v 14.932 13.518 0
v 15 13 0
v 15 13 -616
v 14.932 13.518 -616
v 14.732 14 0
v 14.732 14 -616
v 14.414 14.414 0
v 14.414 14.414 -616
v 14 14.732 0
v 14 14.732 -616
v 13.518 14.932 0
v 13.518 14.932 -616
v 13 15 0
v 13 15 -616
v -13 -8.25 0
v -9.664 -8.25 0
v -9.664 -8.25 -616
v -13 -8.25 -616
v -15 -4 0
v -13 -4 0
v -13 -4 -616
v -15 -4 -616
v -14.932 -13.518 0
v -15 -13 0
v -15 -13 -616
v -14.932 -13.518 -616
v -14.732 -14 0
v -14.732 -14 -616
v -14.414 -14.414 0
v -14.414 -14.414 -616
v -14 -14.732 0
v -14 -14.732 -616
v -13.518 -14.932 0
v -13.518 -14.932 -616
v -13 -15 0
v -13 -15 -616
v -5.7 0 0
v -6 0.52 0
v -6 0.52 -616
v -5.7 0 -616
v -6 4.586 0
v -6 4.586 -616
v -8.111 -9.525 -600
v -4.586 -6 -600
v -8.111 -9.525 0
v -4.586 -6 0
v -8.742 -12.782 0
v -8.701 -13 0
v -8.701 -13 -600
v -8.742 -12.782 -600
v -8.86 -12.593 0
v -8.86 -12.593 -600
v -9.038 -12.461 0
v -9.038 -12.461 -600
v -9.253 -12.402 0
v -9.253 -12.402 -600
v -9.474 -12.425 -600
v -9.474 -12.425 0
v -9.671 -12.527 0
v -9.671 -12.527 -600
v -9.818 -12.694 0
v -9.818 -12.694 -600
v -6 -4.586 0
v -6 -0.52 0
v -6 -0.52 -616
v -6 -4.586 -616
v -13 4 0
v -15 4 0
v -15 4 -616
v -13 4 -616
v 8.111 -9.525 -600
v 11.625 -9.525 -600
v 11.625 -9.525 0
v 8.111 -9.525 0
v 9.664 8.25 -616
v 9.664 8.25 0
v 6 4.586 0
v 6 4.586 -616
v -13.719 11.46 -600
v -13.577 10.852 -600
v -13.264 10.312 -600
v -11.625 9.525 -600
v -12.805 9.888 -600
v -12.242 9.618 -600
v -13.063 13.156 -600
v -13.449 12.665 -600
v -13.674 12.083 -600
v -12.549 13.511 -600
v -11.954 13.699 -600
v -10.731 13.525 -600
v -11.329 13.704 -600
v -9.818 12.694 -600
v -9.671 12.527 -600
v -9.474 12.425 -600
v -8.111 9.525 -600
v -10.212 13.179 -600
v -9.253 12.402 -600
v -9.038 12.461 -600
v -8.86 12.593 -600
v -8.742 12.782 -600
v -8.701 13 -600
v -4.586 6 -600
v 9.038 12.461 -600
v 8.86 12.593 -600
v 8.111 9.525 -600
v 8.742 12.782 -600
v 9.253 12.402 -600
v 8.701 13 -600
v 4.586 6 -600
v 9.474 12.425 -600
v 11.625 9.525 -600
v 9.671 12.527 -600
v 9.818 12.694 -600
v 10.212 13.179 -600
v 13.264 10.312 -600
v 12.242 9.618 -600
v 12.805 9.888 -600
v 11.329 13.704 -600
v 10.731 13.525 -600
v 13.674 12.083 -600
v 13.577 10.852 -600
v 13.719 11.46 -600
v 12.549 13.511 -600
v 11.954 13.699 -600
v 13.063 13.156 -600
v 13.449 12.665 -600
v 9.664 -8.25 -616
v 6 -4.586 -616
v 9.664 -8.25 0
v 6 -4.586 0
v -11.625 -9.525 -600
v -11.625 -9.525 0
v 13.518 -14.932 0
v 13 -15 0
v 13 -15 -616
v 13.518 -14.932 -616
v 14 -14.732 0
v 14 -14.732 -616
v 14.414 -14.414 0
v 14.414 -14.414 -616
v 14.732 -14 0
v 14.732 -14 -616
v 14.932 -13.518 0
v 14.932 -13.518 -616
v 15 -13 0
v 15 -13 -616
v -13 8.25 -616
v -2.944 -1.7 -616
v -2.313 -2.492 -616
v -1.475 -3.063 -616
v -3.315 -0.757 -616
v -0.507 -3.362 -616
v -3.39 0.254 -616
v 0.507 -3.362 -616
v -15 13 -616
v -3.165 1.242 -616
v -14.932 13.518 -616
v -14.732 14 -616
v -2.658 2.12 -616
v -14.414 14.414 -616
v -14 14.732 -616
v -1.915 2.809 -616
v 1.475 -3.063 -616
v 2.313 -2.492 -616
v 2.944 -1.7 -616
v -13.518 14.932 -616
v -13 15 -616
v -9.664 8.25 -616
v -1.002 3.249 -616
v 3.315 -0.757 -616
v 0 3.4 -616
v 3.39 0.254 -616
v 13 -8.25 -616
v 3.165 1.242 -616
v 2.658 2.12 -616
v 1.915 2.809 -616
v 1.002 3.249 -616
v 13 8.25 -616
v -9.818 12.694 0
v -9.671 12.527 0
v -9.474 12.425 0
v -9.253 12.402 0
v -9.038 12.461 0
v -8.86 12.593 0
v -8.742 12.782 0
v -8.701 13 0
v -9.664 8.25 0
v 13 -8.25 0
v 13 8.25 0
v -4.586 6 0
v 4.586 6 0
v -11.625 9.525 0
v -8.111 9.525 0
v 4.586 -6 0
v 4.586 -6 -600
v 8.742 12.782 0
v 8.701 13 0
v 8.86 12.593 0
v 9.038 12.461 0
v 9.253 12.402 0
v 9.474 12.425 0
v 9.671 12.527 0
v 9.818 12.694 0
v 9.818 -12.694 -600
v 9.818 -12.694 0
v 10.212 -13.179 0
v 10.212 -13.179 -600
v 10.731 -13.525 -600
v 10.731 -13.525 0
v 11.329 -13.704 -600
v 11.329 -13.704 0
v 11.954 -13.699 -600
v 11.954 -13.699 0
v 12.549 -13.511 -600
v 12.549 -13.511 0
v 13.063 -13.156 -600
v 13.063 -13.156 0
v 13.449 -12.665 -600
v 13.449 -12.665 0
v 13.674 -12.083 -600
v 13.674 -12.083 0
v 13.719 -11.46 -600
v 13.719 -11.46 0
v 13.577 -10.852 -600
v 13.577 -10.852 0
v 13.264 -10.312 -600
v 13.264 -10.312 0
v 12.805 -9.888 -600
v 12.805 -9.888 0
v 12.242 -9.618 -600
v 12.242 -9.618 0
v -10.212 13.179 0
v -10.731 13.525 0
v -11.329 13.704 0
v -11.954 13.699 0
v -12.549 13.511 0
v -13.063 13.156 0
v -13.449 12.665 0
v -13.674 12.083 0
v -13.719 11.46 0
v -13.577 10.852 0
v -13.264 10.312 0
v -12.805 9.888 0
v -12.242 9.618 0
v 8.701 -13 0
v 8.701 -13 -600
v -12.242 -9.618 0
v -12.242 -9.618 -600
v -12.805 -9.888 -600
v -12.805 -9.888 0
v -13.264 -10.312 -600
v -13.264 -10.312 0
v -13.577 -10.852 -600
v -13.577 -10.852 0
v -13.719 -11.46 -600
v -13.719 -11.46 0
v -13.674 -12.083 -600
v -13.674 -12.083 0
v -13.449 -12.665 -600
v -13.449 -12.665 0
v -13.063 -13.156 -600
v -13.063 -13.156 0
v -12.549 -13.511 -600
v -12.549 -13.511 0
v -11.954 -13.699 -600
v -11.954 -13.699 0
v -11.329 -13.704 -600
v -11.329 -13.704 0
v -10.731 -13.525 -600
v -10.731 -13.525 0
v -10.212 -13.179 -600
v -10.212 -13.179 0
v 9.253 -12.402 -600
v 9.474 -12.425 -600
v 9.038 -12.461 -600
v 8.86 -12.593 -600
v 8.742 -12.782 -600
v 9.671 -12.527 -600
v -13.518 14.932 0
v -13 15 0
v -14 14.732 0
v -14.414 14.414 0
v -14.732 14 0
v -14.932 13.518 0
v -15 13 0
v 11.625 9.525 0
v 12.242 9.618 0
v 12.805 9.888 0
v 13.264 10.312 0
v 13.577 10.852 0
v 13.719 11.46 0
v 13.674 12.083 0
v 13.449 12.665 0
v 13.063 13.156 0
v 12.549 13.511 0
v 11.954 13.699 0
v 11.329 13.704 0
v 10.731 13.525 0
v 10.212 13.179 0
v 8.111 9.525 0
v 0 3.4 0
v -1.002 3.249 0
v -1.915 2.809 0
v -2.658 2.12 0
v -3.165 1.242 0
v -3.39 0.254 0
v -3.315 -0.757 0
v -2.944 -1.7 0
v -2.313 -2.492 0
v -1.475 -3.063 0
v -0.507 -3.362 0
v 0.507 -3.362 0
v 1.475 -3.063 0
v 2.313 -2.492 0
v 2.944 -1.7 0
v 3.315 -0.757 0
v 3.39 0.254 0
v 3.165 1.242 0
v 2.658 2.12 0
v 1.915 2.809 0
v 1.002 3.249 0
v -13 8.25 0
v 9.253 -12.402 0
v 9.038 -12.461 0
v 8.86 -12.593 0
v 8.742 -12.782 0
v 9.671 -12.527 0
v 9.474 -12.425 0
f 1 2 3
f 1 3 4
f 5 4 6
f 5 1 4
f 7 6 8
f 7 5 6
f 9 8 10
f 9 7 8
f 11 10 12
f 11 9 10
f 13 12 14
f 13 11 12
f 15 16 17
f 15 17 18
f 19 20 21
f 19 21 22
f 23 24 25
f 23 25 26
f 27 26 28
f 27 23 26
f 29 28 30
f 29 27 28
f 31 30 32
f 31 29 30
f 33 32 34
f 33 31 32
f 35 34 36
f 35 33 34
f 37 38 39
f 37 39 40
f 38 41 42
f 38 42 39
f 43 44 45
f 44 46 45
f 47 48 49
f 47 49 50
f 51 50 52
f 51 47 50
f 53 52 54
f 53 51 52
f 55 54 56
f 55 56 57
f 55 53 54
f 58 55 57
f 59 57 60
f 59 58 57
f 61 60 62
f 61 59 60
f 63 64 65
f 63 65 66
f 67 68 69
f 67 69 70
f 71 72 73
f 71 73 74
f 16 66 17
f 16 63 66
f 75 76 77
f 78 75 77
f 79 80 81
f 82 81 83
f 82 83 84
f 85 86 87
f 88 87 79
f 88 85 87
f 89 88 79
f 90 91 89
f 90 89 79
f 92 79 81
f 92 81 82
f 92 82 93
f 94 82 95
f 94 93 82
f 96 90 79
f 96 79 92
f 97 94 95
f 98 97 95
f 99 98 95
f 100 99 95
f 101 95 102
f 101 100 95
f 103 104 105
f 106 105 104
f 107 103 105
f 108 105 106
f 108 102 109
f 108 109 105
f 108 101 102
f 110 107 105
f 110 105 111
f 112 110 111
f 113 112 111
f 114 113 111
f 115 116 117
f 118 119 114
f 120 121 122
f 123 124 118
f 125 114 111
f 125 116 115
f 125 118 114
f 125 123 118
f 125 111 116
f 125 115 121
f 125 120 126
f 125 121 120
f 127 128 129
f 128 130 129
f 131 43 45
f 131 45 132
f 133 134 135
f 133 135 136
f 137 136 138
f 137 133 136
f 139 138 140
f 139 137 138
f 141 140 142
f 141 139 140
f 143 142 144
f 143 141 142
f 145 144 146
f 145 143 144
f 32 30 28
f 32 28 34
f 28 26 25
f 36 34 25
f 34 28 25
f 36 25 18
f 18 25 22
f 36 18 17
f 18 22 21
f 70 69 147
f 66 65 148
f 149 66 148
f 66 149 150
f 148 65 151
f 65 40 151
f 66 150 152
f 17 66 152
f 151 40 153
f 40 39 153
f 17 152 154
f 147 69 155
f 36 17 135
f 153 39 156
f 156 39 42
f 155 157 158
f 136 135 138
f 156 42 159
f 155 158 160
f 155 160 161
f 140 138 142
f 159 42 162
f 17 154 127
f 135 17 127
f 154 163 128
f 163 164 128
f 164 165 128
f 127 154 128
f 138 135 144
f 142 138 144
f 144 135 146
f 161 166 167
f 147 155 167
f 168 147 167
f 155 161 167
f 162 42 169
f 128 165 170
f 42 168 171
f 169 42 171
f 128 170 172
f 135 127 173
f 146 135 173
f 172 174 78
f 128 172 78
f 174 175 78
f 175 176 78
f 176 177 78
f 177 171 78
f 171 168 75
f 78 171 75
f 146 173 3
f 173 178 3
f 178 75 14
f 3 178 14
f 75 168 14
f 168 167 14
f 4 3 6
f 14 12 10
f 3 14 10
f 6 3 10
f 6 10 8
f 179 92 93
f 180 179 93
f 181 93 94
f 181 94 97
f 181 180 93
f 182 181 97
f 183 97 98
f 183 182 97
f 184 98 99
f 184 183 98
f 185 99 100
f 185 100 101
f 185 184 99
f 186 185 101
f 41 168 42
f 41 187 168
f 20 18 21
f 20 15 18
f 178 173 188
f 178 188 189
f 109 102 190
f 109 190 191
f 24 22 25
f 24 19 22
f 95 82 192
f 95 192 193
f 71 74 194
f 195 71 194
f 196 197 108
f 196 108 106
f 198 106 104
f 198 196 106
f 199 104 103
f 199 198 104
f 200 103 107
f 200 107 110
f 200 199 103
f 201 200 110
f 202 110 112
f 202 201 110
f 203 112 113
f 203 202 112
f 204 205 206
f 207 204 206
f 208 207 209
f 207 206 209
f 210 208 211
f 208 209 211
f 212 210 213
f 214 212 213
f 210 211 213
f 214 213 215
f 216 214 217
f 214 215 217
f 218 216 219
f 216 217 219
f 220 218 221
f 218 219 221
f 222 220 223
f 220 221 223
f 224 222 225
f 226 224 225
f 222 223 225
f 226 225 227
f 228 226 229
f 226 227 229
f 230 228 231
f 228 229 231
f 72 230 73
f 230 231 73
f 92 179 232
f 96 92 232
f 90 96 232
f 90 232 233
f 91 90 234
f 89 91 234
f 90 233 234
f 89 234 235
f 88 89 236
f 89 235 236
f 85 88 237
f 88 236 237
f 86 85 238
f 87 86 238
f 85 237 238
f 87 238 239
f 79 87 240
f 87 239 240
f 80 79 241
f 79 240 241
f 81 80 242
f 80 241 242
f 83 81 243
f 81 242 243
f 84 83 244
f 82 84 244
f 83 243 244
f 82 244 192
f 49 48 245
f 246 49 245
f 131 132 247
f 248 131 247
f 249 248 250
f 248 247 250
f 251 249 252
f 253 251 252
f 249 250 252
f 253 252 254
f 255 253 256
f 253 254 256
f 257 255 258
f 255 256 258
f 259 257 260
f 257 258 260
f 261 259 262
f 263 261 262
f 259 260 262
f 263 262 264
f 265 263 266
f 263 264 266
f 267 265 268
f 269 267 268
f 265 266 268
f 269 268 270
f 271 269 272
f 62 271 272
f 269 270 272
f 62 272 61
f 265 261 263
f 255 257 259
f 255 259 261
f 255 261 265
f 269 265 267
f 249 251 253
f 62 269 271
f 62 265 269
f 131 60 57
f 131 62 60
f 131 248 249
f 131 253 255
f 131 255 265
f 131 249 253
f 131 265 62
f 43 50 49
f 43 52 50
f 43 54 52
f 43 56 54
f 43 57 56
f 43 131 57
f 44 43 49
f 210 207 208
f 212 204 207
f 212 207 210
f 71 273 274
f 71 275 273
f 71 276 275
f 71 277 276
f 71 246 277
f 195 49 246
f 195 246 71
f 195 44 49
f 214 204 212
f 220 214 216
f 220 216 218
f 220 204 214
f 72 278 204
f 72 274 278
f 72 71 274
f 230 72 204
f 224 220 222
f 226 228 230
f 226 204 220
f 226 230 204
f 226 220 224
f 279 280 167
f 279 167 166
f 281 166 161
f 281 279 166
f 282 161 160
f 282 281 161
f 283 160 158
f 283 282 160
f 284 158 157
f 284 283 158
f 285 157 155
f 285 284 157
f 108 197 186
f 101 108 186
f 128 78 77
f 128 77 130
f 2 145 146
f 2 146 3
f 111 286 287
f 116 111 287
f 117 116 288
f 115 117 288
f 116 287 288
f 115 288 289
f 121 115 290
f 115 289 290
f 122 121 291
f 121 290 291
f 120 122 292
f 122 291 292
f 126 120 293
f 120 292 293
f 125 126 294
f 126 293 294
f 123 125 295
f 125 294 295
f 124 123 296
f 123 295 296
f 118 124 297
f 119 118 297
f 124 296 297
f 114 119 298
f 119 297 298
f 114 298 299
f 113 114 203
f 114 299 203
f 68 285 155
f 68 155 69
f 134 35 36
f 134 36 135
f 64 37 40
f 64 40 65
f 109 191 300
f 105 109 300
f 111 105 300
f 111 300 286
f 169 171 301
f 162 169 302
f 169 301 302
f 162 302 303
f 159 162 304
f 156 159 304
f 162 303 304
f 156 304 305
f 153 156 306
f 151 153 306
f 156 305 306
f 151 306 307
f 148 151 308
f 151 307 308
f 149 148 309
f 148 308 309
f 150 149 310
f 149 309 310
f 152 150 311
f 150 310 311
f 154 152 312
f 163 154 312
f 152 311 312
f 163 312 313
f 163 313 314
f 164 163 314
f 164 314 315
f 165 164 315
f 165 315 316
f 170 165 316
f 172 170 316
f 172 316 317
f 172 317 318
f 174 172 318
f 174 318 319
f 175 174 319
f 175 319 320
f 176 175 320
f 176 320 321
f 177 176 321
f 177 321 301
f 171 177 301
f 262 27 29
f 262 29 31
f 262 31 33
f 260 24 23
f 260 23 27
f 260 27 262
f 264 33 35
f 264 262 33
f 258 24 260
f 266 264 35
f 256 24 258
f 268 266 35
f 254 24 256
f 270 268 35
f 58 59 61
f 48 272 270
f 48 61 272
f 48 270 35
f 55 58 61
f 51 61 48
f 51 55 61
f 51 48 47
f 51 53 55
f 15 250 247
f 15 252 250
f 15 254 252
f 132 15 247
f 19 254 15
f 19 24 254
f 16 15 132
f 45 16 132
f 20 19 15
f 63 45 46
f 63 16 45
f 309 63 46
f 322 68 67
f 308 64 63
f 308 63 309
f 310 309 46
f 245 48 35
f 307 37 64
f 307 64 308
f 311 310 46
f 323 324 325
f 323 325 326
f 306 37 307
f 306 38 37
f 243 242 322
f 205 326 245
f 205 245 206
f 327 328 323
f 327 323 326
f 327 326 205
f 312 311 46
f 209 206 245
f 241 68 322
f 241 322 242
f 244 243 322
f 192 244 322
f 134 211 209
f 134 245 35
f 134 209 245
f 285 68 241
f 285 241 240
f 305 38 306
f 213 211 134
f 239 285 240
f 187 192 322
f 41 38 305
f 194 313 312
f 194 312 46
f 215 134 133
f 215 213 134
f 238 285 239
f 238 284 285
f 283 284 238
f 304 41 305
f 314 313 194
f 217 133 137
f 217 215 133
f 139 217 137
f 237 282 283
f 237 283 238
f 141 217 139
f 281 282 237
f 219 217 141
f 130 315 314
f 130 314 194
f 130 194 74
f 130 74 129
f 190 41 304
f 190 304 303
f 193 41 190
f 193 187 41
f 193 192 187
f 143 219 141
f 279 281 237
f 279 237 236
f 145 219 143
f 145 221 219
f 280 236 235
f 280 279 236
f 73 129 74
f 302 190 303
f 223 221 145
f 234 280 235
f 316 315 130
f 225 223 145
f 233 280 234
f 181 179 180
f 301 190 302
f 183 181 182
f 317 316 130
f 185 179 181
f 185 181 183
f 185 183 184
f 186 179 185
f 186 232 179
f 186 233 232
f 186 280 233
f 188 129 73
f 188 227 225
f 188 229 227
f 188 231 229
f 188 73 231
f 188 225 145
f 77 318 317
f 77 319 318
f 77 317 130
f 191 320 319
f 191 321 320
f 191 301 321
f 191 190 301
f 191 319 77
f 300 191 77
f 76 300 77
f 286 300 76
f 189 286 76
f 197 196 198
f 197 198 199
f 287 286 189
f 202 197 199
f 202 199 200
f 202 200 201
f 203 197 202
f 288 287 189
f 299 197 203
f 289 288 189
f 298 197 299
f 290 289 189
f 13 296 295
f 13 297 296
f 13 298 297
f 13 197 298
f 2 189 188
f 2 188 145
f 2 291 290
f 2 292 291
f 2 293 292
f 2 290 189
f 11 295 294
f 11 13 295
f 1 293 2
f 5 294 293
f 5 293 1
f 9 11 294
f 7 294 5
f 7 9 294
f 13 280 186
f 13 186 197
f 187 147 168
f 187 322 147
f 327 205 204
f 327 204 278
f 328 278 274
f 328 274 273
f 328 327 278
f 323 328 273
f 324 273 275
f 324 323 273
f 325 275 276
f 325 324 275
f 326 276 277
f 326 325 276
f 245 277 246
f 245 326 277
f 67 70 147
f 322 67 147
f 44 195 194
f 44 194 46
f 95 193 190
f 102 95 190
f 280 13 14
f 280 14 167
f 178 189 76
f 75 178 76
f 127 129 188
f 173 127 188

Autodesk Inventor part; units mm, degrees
sketch "Sketch_122" plane through (0, 0, 0) normal (0, 0, 1) x (1, 0, 0)
  arc A0 (-15, -13) -> (-13, -15) centre (-13, -13) ccw
  line L0 (-13, -15) -> (13, -15)
  arc A1 (13, -15) -> (15, -13) centre (13, -13) ccw
  line L1 (15, -13) -> (15, 13)
  arc A2 (15, 13) -> (13, 15) centre (13, 13) ccw
  line L2 (13, 15) -> (-13, 15)
  arc A3 (-13, 15) -> (-15, 13) centre (-13, 13) ccw
  line L3 (-15, 13) -> (-15, 4)
  line L4 (-15, 4) -> (-13, 4)
  line L5 (-13, 4) -> (-13, 8.25)
  line L6 (-13, 8.25) -> (-9.6642, 8.25)
  line L7 (-9.6642, 8.25) -> (-6, 4.5858)
  line L8 (-6, 4.5858) -> (-6, 0.5196)
  line L9 (-6, 0.5196) -> (-5.7, 0)
  line L10 (-5.7, 0) -> (-6, -0.5196)
  line L11 (-6, -0.5196) -> (-6, -4.5858)
  line L12 (-6, -4.5858) -> (-9.6642, -8.25)
  line L13 (-9.6642, -8.25) -> (-13, -8.25)
  line L14 (-13, -8.25) -> (-13, -4)
  line L15 (-13, -4) -> (-15, -4)
  line L16 (-15, -4) -> (-15, -13)
  line L17 (6, -4.5858) -> (9.6642, -8.25)
  line L18 (9.6642, -8.25) -> (13, -8.25)
  line L19 (13, -8.25) -> (13, 8.25)
  line L20 (13, 8.25) -> (9.6642, 8.25)
  line L21 (9.6642, 8.25) -> (6, 4.5858)
  line L22 (6, 4.5858) -> (6, -4.5858)
extrude "Extrusion1" add sketch "Sketch_122" against normal blind 616
sketch "Sketch2" plane through (0, 0, -616) normal (0, 0, -1) x (-1, 0, 0)
  point P0 (0, 0)
hole "Hole1" at (0, 0, -616) direction (0, 0, 1) diameter 6.8 end through all
sketch "Sketch_173" plane through (0, 0, 0) normal (0, 0, 1) x (1, 0, 0)
  arc A0 (-9.8177, 12.6944) -> (-11.625, 9.525) centre (-11.625, 11.625) ccw
  line L0 (-11.625, 9.525) -> (-8.1108, 9.525)
  line L1 (-8.1108, 9.525) -> (-4.5858, 6)
  line L2 (-4.5858, 6) -> (4.5858, 6)
  line L3 (4.5858, 6) -> (8.1108, 9.525)
  line L4 (8.1108, 9.525) -> (11.625, 9.525)
  arc A1 (11.625, 9.525) -> (9.8177, 12.6944) centre (11.625, 11.625) ccw
  arc A2 (8.7013, 13) -> (9.8177, 12.6944) centre (9.3013, 13) ccw
  line L5 (8.7013, 13) -> (-8.7013, 13)
  arc A3 (-9.8177, 12.6944) -> (-8.7013, 13) centre (-9.3013, 13) ccw
extrude "Extrusion2" cut sketch "Sketch_173" against normal blind 600
sketch "Sketch_174" plane through (0, 0, 0) normal (0, 0, 1) x (1, 0, 0)
  arc A0 (-11.625, -9.525) -> (-9.8177, -12.6944) centre (-11.625, -11.625) ccw
  arc A1 (-8.7013, -13) -> (-9.8177, -12.6944) centre (-9.3013, -13) ccw
  line L0 (-8.7013, -13) -> (8.7013, -13)
  arc A2 (9.8177, -12.6944) -> (8.7013, -13) centre (9.3013, -13) ccw
  arc A3 (9.8177, -12.6944) -> (11.625, -9.525) centre (11.625, -11.625) ccw
  line L1 (11.625, -9.525) -> (8.1108, -9.525)
  line L2 (8.1108, -9.525) -> (4.5858, -6)
  line L3 (4.5858, -6) -> (-4.5858, -6)
  line L4 (-4.5858, -6) -> (-8.1108, -9.525)
  line L5 (-8.1108, -9.525) -> (-11.625, -9.525)
extrude "Extrusion3" cut sketch "Sketch_174" against normal blind 600
ref_plane "C1_XY" through (0, 0, 0) normal (0, 0, 1) x (1, 0, 0)
ref_plane "C1_YZ" through (0, 0, 0) normal (1, 0, 0) x (0, 1, 0)
ref_plane "C1_ZX" through (0, 0, 0) normal (0, 1, 0) x (0, 0, 1)
ref_plane "to_frame_cap1_XY" through (0, 0, 0) normal (0, 0, 1) x (1, 0, 0)
ref_plane "to_frame_cap1_YZ" through (0, 0, 0) normal (1, 0, 0) x (0, 1, 0)
ref_plane "to_frame_cap1_ZX" through (0, 0, 0) normal (0, 1, 0) x (0, 0, 1)
ref_plane "to_frame_cap2_XY" through (0, 0, -600) normal (0, 0, -1) x (1, 0, 0)
ref_plane "to_frame_cap2_YZ" through (0, 0, -600) normal (1, 0, 0) x (0, -1, 0)
ref_plane "to_frame_cap2_ZX" through (0, 0, -600) normal (0, -1, 0) x (0, 0, -1)
thread "Thread1" size "M8x1.25" class "6H" standard "ANSI Metric M Profile" length 10
thread "Thread2" size "M7x1" class "6H" standard "ANSI Metric M Profile" length 10
properties part number "HFSC6-3030-616" material "Aluminum 6061"
